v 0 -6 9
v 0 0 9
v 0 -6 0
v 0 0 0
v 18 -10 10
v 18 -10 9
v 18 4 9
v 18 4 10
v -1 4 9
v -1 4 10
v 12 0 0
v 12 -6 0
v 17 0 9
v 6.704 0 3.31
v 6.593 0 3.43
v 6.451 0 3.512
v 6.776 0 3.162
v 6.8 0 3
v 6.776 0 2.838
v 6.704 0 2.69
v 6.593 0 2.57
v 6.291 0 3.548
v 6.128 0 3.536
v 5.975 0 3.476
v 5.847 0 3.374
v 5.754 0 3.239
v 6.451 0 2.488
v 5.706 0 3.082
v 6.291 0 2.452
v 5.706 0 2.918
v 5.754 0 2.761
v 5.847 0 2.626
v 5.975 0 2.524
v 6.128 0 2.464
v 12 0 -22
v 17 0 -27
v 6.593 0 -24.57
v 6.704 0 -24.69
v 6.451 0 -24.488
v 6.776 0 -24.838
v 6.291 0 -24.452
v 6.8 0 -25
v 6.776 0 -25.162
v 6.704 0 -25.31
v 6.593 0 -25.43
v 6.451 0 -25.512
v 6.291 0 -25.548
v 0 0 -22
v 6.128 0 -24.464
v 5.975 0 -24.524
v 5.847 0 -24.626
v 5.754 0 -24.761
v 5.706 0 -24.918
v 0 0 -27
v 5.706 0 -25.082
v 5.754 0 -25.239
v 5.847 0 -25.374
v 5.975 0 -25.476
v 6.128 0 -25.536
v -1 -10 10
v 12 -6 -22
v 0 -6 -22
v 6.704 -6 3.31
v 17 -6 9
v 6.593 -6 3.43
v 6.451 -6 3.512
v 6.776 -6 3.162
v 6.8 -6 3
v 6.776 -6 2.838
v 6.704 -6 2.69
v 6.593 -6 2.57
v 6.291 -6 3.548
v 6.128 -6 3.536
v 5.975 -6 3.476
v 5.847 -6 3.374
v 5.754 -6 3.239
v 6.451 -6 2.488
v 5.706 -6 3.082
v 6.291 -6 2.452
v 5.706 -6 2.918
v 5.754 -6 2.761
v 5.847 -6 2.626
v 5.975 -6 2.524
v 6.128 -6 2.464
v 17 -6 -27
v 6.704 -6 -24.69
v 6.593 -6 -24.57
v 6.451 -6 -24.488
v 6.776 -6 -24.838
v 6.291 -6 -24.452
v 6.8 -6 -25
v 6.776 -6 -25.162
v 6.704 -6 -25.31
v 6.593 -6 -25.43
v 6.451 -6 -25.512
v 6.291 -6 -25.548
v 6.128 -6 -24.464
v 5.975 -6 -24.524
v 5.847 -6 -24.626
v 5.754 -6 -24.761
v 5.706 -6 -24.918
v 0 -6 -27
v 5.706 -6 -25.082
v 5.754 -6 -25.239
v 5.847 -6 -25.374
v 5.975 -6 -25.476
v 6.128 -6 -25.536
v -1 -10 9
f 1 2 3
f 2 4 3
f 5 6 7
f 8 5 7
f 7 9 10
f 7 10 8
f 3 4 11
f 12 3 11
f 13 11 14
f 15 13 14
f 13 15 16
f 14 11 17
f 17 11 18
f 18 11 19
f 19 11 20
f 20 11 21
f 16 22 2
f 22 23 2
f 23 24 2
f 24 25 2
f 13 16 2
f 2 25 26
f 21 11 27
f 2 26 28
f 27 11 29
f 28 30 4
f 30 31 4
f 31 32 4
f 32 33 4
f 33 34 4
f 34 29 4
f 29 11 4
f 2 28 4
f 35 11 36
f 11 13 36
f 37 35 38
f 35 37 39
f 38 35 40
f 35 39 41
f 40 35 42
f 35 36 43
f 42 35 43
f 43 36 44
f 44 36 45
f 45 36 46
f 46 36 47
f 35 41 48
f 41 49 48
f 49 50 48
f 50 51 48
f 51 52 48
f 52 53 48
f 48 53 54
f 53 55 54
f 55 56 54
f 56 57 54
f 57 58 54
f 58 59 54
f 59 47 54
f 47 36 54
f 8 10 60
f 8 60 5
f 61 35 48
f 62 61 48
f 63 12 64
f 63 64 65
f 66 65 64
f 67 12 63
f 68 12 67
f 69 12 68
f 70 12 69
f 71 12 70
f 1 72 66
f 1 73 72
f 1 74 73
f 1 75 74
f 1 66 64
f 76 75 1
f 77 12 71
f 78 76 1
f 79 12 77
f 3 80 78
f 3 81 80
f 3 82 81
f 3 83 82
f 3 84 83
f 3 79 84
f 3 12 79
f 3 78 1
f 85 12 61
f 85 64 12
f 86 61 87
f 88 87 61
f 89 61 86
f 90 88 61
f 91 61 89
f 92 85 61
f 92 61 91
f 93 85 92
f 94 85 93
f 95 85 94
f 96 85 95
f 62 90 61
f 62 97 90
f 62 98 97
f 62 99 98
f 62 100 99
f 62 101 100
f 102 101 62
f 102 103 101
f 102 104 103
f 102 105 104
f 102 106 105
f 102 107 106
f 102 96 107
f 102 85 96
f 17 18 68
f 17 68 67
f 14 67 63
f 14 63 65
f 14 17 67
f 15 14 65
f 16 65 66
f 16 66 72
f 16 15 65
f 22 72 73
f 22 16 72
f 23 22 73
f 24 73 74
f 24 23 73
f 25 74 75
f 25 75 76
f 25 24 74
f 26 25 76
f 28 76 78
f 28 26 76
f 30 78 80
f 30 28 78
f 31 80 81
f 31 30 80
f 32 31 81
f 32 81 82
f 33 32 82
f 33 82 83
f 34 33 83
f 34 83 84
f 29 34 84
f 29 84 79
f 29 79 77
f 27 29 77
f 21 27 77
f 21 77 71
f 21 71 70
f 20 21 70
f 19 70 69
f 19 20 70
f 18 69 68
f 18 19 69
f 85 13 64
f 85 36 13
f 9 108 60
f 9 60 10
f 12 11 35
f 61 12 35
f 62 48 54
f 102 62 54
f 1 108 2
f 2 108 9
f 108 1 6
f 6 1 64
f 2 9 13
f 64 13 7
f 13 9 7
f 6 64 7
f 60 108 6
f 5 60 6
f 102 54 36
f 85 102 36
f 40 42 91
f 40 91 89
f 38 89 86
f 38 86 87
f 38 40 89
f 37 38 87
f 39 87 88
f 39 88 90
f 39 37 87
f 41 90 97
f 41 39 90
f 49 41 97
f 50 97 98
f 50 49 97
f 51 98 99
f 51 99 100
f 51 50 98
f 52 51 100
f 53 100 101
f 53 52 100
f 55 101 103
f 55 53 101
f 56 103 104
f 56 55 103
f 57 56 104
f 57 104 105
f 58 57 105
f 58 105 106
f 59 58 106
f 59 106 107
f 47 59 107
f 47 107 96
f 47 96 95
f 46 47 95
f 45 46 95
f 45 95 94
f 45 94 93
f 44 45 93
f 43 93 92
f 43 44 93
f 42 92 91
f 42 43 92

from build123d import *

# Parameters (mm, degrees)
F0_R     = 0.55
F1_DEPTH = 6
F2_DEPTH = 4
F3_W     = 19
F3_H     = 14
F3_W_2   = 17
F3_H_2   = 6
F4_DEPTH = 1


with BuildPart() as f1:
    # F0 (on Front) → F1 (new body)
    with BuildSketch(Plane.XZ):
        Polygon((0, 5), (0, 0), (12, 0), (12, -22), (0, -22), (0, -27), (12, -27), (17, -27), (17, 5), (12, 5), align=None)
        with Locations((6.25, -25)):
            Circle(F0_R, mode=Mode.SUBTRACT)
        with Locations((6.25, 3)):
            Circle(F0_R, mode=Mode.SUBTRACT)
    extrude(amount=F1_DEPTH)

    # F2 (add): a face of the model
    f2_faces = [f1.faces().sort_by_distance(p)[0] for p in [
        (8.5, -3, 5),
    ]]
    extrude(f2_faces, amount=F2_DEPTH)

    # F3 (on face) → F4 (join)
    with BuildSketch(Plane.XY.offset(9)):
        with Locations((8.5, -3)):
            Rectangle(F3_W, F3_H)
        with Locations((8.5, -3)):
            Rectangle(F3_W_2, F3_H_2, mode=Mode.SUBTRACT)
        with Locations((8.5, -3)):
            Rectangle(F3_W_2, F3_H_2)
    extrude(amount=F4_DEPTH)


solid = f1.part
